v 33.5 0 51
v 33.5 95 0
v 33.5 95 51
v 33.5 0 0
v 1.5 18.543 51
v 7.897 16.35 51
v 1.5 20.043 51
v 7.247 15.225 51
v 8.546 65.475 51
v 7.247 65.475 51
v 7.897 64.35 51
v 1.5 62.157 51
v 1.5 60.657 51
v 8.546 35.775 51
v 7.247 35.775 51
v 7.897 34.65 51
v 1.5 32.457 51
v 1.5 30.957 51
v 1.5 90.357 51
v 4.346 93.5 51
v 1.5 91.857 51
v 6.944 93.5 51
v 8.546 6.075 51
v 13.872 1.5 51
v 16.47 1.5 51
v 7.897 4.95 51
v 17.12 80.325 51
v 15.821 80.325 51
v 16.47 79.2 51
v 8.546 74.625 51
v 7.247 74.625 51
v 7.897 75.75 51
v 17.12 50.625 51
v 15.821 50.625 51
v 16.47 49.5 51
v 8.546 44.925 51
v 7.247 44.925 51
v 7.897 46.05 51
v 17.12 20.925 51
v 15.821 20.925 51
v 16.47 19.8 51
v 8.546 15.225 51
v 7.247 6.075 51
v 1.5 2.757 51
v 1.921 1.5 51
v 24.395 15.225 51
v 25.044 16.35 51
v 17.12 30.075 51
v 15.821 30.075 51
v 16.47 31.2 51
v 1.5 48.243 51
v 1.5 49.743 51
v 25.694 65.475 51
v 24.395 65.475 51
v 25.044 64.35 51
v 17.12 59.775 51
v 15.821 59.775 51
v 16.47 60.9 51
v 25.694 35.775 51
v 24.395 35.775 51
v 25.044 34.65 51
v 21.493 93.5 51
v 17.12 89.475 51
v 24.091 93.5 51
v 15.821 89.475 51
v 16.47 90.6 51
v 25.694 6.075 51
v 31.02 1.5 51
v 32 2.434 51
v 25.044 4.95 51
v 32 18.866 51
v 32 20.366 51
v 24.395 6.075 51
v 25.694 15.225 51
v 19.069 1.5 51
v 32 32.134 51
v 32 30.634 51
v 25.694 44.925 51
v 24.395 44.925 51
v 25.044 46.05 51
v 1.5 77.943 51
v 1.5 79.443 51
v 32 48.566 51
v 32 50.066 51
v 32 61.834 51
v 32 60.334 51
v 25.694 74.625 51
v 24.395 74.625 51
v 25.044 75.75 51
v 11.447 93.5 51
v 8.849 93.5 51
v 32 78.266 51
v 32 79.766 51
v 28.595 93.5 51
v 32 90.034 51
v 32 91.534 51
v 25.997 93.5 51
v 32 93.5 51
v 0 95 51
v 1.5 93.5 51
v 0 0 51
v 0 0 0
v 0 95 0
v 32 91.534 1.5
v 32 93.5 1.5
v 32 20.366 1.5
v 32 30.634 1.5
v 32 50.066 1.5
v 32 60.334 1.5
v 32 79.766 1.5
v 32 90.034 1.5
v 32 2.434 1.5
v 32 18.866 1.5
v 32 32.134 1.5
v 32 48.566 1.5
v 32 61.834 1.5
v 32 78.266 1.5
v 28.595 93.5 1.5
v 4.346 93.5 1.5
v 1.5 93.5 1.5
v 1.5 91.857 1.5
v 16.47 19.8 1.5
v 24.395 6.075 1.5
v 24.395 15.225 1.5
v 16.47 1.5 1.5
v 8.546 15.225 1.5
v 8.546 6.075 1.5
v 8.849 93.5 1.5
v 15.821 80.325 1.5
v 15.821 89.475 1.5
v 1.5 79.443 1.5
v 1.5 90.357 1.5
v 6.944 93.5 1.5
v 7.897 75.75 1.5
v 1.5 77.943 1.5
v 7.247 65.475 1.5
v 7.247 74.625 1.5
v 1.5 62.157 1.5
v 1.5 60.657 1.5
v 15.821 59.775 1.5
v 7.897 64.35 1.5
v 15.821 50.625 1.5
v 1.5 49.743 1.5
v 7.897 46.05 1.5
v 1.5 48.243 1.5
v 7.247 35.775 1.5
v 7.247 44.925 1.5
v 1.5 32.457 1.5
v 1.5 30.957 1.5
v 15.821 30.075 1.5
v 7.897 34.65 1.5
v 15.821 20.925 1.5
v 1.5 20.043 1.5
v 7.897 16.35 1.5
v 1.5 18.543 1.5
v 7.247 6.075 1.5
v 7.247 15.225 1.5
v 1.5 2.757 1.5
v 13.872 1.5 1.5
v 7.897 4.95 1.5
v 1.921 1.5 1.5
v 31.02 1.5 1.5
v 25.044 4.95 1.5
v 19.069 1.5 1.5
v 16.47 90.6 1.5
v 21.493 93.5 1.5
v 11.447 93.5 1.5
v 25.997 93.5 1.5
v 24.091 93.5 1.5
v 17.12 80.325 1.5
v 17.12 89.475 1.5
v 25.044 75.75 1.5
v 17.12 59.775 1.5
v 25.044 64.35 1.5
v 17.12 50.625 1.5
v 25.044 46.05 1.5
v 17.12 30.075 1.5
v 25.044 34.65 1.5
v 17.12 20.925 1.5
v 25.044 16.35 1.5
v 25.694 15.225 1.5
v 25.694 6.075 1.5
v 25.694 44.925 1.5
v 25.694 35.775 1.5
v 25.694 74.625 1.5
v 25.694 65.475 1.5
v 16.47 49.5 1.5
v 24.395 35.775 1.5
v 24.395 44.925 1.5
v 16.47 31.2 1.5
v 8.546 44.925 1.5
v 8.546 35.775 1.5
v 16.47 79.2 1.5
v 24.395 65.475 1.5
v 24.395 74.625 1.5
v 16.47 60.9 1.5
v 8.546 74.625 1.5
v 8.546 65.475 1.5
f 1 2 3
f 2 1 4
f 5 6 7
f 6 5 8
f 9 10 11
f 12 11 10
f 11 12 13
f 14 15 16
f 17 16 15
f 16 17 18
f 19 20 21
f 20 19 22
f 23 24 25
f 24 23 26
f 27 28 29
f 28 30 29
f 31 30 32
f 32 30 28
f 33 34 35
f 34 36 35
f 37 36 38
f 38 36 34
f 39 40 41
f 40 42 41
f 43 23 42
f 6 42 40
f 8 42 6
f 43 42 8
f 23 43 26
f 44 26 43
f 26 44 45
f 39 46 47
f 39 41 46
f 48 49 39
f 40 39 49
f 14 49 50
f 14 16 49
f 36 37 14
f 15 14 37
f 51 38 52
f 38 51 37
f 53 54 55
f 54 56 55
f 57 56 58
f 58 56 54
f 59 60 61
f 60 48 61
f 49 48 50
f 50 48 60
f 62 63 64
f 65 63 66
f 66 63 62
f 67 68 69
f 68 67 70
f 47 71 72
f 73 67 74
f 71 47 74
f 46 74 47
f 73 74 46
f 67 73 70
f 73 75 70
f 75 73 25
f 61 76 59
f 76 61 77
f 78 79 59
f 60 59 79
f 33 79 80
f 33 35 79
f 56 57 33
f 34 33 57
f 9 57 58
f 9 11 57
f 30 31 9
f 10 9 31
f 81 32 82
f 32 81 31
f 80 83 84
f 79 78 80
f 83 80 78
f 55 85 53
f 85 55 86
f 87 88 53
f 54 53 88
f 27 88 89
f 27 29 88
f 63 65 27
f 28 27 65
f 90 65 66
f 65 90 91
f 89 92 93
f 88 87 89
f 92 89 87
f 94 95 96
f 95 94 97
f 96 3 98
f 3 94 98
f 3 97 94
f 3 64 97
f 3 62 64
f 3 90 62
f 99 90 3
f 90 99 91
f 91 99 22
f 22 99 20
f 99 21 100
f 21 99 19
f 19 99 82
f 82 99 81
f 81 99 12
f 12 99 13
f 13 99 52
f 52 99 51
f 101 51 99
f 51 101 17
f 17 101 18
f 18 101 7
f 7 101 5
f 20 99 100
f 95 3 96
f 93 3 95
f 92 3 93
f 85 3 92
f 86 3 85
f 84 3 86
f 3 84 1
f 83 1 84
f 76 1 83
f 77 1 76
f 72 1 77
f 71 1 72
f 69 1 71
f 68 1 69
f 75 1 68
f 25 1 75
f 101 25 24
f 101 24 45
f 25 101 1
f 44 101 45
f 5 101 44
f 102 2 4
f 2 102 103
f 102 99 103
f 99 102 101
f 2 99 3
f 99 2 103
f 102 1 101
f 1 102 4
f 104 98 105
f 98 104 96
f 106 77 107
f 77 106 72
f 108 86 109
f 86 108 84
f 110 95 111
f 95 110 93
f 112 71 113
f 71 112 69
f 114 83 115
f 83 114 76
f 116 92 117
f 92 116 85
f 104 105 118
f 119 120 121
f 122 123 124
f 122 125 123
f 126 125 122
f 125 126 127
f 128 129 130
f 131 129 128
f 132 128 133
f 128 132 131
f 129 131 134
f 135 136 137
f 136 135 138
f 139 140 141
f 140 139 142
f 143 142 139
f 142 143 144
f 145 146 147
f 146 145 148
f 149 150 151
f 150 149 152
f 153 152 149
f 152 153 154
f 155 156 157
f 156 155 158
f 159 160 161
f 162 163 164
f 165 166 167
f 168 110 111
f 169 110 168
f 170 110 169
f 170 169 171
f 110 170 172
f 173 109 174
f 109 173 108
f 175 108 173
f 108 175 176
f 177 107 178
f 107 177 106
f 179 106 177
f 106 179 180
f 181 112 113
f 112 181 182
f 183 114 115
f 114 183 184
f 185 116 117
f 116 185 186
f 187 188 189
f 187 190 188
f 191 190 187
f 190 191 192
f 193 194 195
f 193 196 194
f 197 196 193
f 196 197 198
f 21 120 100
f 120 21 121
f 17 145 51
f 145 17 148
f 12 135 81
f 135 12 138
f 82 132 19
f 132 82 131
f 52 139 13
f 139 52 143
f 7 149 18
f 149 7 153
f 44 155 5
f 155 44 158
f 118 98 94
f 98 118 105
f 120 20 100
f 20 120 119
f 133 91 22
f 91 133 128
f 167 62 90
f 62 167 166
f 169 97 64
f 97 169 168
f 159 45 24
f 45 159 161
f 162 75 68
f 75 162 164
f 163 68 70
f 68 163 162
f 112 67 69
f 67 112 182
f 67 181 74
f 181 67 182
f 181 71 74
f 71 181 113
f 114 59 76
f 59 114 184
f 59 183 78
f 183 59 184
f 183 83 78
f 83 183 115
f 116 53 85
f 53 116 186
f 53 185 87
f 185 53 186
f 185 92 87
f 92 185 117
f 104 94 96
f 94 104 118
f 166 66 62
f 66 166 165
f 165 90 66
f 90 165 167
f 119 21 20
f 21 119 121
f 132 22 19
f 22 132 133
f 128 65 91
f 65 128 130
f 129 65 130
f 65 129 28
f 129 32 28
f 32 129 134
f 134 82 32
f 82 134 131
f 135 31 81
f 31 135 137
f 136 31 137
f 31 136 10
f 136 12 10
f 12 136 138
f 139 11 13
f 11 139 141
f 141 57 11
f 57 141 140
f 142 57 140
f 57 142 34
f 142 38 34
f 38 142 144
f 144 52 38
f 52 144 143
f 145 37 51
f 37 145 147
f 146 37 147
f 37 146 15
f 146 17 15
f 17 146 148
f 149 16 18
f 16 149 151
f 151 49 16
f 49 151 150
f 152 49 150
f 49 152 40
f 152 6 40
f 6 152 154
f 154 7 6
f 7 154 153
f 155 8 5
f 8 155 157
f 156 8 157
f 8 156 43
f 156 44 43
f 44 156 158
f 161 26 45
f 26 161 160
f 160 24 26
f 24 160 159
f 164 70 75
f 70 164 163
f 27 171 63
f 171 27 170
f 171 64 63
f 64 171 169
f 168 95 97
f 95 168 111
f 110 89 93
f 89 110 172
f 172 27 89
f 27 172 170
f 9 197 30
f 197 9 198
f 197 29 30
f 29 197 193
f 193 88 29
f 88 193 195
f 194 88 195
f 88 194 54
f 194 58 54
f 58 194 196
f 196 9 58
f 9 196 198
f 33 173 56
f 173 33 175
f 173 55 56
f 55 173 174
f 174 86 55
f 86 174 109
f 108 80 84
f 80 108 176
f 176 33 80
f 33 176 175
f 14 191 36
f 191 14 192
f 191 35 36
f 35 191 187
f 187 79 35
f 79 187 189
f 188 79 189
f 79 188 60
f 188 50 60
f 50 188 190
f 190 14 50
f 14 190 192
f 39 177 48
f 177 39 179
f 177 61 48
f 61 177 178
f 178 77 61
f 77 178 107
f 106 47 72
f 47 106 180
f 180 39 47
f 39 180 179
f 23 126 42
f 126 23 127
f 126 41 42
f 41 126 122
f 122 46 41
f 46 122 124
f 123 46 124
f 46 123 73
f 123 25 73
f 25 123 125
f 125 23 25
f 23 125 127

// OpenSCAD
/* [Dimensions] */
//In mm, how wide should the spacer be??
spacer_width = 33.5; //[1:0.5:200]

//In mm, how long should the spacer be??
spacer_length = 95; //[1:0.5:200]

//In mm, how tall should the spacer be??
spacer_height = 51; //[1:0.5:200]

/* [Advanced] */
//In mm, how thick should the walls be?
thickness_of_walls = 1.5; //[1:0.1:5]

//In mm, what should the radius of the honeycomb be?
honeycomb_radius = 9.9; //[1:0.1:100]

// ########## Project Space #########
w_offset = thickness_of_walls * 2;

difference() {
  cube([spacer_width, spacer_length, spacer_height]);
  translate([thickness_of_walls, thickness_of_walls, thickness_of_walls]) {
    cube([spacer_width - w_offset, spacer_length - w_offset, spacer_height]);
  }
}

linear_extrude(spacer_height) honeycomb_square([spacer_width, spacer_length], honeycomb_radius, thickness_of_walls, false);

// ############ Modules #############
module honeycomb(r, thickness=1, cols=0, rows=0, center=false) {
  translate([ // if center is true, calculate total size and translate accordingly
    center ? ( cols * r / tan(30) + (r + thickness) / tan(30) / 2 ) /-2 : 0,
    center ? ( rows * r * sin(30) + (rows+0.5) * r + thickness ) /-2 : 0
  ])
  translate([ (r+thickness/2) / 2 / tan(30), r+thickness/2])  // Move so it starts at 0, 0
  for (j = [ 0 : 1 : rows-1 ] ) {  // Iterate rows
    translate([ r / 2 / tan(30) * (j%2) , j * (r + r * sin(30)) ])
    for (i = [ 0 : 1 : cols-1 ]) { // Iterate columns
      translate([ i * ( r / tan(30) ) , 0]) rotate([0, 0, 90]) {

        // Make the hexagons
        if (thickness==0) {
          circle(r, $fn=6);
        }
        else {
          difference() {
            circle(r+thickness/2, $fn=6);
            circle(r-thickness/2, $fn=6);
          }
        }
      }
    }
  }
}

module honeycomb_square(dimensions = [10, 10], r=1, thickness=1, center=false) {
  
  intersection() {
    translate([r * -1, 0, 0])
    honeycomb(r=r, thickness=thickness,
      cols = (dimensions[0] - (r + thickness) / tan(30) / 2) / (r / tan(30)) + 2,
      rows = dimensions[1] / (r*2 - thickness) + 1,
      center=center);
   
    square(dimensions, center=center); 
  }
}
